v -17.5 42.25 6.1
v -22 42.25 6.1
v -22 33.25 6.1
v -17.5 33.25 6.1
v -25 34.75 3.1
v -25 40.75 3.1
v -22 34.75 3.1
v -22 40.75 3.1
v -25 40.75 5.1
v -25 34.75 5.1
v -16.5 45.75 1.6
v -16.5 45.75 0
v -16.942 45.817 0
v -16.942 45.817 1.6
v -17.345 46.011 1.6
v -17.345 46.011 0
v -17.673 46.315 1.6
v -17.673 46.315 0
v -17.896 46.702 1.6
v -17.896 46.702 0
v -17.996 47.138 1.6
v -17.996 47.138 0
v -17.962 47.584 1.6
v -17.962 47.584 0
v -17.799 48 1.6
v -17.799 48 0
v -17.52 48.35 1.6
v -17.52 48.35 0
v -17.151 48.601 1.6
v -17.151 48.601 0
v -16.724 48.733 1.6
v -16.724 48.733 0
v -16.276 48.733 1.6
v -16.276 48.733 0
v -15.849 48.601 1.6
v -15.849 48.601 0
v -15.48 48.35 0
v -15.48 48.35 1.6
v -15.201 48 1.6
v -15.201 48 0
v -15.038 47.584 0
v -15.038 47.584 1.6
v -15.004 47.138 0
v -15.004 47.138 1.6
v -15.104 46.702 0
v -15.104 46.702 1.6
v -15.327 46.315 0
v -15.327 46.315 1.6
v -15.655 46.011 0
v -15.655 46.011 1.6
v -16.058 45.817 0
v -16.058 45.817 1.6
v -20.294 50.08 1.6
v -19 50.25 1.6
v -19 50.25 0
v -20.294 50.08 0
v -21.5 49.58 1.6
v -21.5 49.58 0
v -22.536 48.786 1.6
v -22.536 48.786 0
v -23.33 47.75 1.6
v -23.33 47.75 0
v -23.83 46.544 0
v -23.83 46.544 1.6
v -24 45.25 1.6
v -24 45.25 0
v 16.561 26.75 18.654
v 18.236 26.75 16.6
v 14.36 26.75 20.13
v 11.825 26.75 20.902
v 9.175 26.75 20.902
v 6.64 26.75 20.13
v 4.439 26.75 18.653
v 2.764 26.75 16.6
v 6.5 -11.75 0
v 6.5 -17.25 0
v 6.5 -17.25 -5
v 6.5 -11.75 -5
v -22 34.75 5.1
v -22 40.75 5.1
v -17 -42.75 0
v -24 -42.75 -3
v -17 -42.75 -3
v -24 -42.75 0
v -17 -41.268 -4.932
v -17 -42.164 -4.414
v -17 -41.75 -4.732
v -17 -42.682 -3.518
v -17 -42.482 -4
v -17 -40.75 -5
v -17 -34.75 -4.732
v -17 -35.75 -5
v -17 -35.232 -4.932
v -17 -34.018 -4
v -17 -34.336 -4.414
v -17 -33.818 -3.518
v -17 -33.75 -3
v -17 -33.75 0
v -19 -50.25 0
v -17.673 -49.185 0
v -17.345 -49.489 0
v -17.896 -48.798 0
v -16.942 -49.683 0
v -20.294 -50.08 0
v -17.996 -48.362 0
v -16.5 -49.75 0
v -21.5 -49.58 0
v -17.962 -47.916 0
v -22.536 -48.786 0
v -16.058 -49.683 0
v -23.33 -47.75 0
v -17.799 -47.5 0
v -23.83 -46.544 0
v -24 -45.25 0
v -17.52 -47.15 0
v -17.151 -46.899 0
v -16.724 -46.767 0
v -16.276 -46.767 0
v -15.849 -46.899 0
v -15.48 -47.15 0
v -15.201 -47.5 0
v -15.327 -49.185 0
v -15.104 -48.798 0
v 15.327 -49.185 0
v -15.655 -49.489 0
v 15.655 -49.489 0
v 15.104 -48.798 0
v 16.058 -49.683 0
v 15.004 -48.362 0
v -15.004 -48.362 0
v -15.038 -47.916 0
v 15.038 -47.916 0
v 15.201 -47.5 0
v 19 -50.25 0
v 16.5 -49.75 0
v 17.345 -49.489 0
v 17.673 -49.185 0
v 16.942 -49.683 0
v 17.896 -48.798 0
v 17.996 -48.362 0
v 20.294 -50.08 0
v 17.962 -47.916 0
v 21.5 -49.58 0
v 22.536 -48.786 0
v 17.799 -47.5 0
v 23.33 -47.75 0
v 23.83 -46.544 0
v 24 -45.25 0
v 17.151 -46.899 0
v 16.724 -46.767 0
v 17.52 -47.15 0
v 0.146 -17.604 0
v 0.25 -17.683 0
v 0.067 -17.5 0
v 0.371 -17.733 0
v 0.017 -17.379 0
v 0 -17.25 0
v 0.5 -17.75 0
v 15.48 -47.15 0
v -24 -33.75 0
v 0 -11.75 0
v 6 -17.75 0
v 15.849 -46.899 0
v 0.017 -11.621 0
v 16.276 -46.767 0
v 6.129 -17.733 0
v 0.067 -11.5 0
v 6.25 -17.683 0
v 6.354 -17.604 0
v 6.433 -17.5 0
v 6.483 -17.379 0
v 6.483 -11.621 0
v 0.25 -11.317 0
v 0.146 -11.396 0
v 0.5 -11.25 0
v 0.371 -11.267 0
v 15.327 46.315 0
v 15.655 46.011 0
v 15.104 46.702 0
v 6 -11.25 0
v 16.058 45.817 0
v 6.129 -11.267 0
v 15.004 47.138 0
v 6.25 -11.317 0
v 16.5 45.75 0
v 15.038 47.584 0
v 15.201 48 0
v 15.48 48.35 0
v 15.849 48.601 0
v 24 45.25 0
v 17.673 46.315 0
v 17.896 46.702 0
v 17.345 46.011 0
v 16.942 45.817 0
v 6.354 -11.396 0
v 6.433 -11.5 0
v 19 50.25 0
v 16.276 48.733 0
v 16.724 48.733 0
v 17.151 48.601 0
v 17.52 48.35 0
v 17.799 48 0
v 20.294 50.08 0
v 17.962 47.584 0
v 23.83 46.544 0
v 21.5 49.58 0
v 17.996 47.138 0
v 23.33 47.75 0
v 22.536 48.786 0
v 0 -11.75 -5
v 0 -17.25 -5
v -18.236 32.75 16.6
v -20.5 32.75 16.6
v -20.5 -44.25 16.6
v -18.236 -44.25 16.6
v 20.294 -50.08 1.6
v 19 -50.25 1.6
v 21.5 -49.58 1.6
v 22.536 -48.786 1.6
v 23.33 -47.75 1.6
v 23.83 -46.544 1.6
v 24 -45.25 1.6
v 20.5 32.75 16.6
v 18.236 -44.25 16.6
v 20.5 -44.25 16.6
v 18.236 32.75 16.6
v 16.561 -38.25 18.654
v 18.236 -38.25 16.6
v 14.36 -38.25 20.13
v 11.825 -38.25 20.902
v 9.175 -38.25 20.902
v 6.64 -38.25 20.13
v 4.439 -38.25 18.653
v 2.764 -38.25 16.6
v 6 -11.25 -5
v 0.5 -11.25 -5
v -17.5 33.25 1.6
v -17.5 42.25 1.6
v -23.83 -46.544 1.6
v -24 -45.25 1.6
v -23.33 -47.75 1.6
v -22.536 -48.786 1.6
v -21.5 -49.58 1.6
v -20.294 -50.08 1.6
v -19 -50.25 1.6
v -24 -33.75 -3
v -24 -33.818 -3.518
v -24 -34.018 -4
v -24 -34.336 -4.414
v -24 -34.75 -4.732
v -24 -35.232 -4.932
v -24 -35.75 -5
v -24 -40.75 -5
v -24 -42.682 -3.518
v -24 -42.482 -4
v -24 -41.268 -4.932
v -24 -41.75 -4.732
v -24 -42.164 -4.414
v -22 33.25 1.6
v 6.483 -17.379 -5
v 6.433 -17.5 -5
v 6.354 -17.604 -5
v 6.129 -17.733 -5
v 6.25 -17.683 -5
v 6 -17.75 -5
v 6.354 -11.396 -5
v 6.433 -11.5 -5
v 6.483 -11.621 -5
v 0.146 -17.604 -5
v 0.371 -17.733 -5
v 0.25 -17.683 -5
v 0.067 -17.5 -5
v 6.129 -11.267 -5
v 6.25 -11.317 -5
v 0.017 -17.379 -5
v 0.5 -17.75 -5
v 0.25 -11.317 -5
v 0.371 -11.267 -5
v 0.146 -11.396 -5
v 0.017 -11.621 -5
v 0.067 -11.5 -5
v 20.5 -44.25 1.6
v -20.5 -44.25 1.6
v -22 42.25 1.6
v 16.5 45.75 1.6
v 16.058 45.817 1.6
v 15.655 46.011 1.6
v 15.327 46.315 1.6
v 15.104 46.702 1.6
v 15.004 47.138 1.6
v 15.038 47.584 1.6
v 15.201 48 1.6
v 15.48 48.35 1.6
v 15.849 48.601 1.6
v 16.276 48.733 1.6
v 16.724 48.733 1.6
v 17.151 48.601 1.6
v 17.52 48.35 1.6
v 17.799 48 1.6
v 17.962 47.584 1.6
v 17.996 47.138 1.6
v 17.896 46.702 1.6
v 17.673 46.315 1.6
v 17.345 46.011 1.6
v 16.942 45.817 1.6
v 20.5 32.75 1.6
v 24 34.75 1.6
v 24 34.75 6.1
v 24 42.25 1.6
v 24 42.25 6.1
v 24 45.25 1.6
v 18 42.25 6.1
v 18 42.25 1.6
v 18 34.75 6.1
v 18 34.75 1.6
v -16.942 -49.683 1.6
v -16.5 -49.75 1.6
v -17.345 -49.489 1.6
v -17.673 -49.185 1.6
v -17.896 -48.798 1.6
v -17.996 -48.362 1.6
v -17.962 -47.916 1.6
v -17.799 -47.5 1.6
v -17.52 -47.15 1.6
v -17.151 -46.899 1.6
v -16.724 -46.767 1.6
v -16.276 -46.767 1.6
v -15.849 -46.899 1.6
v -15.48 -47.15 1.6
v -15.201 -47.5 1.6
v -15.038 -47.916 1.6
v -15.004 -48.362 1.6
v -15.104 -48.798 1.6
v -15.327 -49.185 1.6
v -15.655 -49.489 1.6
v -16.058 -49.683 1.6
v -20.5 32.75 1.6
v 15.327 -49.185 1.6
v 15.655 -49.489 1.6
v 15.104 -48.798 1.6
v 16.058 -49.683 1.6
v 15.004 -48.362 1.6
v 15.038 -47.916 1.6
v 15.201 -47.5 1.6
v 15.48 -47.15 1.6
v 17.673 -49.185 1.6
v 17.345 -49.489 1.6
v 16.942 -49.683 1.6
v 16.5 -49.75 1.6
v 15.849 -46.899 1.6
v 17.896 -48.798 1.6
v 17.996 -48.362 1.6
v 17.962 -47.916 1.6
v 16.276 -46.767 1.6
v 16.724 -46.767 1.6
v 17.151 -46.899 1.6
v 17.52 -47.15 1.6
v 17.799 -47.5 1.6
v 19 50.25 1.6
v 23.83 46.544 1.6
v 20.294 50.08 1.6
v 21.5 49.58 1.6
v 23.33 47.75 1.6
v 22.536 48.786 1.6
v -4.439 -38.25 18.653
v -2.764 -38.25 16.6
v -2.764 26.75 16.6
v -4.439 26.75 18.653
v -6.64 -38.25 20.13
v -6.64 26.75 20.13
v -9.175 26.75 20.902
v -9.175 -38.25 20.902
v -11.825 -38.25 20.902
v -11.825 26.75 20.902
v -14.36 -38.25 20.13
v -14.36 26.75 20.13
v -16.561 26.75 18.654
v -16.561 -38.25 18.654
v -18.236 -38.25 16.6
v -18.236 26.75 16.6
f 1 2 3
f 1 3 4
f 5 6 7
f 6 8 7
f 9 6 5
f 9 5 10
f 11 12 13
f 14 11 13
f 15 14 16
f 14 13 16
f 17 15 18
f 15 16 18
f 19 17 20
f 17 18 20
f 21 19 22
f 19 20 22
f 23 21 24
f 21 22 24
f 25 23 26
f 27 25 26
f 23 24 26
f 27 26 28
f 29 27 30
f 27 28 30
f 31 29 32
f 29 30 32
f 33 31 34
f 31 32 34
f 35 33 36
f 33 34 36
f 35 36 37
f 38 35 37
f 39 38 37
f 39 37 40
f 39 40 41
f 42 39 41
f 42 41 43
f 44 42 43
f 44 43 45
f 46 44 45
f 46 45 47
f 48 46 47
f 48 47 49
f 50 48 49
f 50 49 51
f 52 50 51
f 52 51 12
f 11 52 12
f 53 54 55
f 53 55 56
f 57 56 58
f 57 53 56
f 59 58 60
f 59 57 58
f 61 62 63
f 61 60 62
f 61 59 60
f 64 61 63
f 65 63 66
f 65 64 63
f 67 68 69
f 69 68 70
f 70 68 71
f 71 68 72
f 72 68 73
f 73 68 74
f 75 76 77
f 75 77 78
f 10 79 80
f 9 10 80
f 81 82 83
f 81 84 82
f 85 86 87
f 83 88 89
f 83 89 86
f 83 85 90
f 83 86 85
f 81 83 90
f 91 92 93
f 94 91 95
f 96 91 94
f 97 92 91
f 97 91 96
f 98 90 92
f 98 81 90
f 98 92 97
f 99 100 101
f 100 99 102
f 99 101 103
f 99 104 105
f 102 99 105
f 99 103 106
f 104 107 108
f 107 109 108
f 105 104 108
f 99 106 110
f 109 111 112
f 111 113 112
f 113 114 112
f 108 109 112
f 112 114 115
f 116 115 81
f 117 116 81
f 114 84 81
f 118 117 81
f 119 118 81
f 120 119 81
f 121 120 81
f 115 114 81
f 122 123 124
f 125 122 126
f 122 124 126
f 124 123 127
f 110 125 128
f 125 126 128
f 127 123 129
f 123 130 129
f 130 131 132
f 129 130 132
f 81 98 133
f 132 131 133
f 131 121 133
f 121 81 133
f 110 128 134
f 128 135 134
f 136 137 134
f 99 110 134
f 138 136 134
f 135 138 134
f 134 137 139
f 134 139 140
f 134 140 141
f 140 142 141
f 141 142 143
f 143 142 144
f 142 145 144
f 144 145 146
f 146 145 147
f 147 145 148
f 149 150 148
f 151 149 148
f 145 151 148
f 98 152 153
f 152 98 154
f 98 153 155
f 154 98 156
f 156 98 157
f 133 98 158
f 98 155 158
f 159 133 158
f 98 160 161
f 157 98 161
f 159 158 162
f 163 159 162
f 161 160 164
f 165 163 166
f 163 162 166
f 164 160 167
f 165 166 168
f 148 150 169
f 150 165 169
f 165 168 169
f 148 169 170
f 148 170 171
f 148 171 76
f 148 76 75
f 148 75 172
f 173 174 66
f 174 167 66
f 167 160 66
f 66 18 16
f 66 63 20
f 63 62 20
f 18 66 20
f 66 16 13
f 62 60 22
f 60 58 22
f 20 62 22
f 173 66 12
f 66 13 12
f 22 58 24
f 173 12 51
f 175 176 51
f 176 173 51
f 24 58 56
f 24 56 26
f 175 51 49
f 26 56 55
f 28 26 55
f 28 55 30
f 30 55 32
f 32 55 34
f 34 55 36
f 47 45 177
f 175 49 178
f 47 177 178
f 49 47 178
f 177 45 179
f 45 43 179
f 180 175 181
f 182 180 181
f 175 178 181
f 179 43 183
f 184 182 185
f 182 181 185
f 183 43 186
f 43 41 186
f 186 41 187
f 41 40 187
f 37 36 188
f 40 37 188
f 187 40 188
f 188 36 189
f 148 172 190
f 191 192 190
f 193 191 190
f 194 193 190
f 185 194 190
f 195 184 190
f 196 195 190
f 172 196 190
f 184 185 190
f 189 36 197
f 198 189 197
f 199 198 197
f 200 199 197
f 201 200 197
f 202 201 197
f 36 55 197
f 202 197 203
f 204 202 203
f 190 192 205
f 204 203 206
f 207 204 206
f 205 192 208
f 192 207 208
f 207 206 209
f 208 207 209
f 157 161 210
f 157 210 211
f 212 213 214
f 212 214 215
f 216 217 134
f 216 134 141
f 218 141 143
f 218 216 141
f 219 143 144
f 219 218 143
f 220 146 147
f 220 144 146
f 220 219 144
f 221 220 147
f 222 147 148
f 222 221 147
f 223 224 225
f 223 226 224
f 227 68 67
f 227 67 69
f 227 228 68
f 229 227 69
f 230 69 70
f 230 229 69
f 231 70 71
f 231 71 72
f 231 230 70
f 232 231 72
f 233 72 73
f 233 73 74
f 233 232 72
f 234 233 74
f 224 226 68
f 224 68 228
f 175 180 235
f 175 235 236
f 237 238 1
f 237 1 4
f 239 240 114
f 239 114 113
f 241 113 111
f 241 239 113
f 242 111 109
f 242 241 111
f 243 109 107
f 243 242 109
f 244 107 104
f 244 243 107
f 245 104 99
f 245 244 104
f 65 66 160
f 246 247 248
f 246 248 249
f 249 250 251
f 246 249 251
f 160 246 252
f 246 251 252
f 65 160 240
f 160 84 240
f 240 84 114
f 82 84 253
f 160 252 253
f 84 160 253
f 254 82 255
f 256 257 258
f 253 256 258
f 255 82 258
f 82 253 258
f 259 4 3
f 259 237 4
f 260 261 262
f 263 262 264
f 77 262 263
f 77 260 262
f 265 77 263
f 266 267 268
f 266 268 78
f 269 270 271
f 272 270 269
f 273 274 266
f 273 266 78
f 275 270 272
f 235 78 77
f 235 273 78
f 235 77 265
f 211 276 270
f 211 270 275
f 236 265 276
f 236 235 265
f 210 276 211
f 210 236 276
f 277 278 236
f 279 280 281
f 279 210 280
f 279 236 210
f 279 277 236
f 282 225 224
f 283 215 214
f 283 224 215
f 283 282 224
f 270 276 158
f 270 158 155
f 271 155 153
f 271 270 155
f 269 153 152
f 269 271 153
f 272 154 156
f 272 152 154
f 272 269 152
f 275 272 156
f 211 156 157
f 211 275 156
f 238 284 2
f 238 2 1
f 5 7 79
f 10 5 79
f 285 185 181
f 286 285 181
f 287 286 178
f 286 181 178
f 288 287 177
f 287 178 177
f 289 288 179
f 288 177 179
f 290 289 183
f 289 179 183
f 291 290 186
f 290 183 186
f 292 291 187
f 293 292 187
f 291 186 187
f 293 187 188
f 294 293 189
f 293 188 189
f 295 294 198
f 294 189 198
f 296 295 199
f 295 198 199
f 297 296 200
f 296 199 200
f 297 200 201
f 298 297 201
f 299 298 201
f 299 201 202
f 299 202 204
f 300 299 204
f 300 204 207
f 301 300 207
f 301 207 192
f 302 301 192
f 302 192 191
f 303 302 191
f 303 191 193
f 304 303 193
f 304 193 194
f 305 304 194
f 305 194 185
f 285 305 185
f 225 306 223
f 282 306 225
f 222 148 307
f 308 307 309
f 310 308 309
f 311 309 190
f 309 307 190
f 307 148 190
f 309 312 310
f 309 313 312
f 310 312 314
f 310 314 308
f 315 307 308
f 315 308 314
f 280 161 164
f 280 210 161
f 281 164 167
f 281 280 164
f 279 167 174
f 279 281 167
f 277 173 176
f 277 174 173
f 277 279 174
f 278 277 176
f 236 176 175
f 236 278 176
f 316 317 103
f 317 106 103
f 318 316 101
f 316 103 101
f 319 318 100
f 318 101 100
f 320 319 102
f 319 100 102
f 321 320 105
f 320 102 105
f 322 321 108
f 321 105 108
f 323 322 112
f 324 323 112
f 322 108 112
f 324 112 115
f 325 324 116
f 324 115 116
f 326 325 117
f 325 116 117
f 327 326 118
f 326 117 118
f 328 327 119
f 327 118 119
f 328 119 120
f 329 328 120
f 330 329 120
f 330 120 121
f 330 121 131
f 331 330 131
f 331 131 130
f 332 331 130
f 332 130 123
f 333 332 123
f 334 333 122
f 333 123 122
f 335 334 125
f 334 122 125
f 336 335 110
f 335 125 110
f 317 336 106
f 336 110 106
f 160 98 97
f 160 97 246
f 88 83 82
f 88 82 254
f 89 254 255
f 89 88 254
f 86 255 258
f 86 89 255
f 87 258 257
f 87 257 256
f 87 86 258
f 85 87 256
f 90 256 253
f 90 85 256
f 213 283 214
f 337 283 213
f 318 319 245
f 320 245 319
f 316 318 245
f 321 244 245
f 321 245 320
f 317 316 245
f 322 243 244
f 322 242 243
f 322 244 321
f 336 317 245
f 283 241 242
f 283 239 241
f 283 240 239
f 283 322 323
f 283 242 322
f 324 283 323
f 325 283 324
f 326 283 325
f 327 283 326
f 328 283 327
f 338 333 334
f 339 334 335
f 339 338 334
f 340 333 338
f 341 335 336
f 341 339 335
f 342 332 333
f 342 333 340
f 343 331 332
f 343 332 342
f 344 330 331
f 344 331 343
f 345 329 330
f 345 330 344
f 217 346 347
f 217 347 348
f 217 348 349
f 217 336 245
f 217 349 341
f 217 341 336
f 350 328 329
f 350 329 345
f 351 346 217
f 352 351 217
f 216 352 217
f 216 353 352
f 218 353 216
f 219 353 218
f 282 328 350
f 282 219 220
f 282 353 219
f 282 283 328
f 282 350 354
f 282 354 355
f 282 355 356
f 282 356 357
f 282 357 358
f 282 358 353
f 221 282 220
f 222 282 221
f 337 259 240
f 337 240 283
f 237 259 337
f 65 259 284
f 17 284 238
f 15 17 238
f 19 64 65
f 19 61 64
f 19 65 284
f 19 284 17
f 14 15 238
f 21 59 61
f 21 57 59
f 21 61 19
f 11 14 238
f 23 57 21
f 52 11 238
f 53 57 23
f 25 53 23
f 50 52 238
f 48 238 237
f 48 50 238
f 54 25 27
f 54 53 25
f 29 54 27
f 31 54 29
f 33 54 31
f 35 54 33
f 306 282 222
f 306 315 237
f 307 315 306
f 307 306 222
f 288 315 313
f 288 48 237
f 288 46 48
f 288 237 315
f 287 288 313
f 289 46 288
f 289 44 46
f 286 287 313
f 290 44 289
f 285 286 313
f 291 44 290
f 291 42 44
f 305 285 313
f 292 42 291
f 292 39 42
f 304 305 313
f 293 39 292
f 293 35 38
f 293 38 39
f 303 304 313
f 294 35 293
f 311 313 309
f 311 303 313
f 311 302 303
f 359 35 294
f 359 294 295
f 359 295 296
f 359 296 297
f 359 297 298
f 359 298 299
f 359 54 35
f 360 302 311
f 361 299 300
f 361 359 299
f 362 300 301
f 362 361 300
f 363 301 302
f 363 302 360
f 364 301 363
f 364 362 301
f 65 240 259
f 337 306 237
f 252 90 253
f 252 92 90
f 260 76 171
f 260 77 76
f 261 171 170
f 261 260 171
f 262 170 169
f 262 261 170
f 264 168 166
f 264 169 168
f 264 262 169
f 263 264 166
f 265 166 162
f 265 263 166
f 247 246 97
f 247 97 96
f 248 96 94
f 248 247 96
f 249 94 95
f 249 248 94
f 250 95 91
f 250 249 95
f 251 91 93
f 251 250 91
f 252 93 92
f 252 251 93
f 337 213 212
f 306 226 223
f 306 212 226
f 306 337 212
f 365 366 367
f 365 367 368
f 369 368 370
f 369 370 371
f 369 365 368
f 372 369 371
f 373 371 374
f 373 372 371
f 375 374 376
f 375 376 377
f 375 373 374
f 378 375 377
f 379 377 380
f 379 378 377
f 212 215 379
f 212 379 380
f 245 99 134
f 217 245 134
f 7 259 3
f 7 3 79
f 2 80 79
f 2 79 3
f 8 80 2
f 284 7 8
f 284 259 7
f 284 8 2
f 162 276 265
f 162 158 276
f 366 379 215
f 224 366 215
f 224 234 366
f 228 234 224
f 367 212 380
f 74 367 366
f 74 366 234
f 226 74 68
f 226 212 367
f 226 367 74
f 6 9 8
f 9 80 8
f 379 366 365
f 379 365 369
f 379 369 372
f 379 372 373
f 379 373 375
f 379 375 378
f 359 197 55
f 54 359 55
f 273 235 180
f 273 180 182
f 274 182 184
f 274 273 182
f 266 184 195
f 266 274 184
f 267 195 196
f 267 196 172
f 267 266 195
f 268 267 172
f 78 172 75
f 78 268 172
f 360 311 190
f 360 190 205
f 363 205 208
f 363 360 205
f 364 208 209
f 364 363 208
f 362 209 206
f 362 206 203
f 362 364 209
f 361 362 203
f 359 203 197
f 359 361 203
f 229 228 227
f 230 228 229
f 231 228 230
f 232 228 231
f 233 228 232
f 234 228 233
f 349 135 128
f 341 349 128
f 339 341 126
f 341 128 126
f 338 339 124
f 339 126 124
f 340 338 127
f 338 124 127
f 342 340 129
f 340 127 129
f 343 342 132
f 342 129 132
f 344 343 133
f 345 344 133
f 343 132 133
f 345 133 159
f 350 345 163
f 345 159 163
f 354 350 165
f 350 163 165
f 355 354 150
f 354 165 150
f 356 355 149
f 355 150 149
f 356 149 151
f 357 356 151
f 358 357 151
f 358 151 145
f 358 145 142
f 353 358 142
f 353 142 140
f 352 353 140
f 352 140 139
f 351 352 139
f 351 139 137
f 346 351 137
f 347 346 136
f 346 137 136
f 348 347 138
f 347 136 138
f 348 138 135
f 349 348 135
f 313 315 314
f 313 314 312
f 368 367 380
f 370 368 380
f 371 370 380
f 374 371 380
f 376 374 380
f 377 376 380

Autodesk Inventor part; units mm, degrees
ref_plane "YZ Plane" through (0, 0, 0) normal (1, 0, 0) x (0, 1, 0)
ref_plane "XZ Plane" through (0, 0, 0) normal (0, 1, 0) x (-1, 0, 0)
ref_plane "XY Plane" through (0, 0, 0) normal (0, 0, 1) x (1, 0, 0)
sketch "Skizze1" plane through (0, 0, 0) normal (0, 0, 1) x (1, 0, 0)
  line L0 (24, 50.25) -> (-24, 50.25)
  line L1 (-24, 50.25) -> (-24, -50.25)
  line L2 (-24, -50.25) -> (24, -50.25)
  line L3 (24, -50.25) -> (24, 50.25)
  line L4 (24, 50.25) -> (-24, -50.25) construction
  line L5 (-24, 50.25) -> (24, -50.25) construction
  point P0 (0, 0)
  dimension "d0" = 48
  dimension "d1" = 100.5
extrude "Extrusion1" add sketch "Skizze1" along normal blind 1.6
fillet "Rundung1" radius 5 4 edges at (24, 50.25, 0.8) (-24, 50.25, 0.8) (24, -50.25, 0.8) (-24, -50.25, 0.8)
sketch "Skizze2" plane through (0, 0, 0) normal (0, 0, -1) x (-1, 0, 0)
  line L0 (-6.5, -11.25) -> (0, -11.25)
  line L1 (0, -11.25) -> (0, -17.75)
  line L2 (0, -17.75) -> (-6.5, -17.75)
  line L3 (-6.5, -17.75) -> (-6.5, -11.25)
  line L4 (-6.5, -11.25) -> (0, -17.75) construction
  line L5 (0, -11.25) -> (-6.5, -17.75) construction
  line L6 (19, -50.25) -> (-19, -50.25) projected
  line L7 (-24, -45.25) -> (-24, 45.25) projected
  point P0 (0, 0)
  point P1 (-3.25, -14.5)
  point P2 (-3.25, -17.75)
  dimension "d5" = 32.5
  dimension "d6" = 17.5
  dimension "d7" = 6.5
  dimension "d8" = 6.5
extrude "Extrusion2" add sketch "Skizze2" along normal blind 5
fillet "Rundung2" radius 0.5 4 edges at (0, -11.25, -2.5) (0, -17.75, -2.5) (6.5, -17.75, -2.5) (6.5, -11.25, -2.5)
sketch "Skizze3" plane through (0, 0, 0) normal (0, 0, -1) x (-1, 0, 0)
  line L0 (17, -33.75) -> (24, -33.75)
  line L1 (24, -33.75) -> (24, -42.75)
  line L2 (24, -42.75) -> (17, -42.75)
  line L3 (17, -42.75) -> (17, -33.75)
  line L4 (17, -33.75) -> (24, -42.75) construction
  line L5 (24, -33.75) -> (17, -42.75) construction
  line L6 (19, -50.25) -> (-19, -50.25) projected
  line L7 (24, 45.25) -> (24, -45.25) projected
  point P0 (0, 0)
  point P1 (20.5, -38.25)
  dimension "d12" = 7.5
  dimension "d13" = 7
  dimension "d14" = 9
extrude "Extrusion3" add sketch "Skizze3" along normal blind 5
fillet "Rundung3" radius 2 2 edges at (-20.5, -33.75, -5) (-20.5, -42.75, -5)
sketch "Skizze4" plane through (0, 0, 1.6) normal (0, 0, 1) x (1, 0, 0)
  line L0 (18, 42.25) -> (24, 42.25)
  line L1 (24, 42.25) -> (24, 34.75)
  line L2 (24, 34.75) -> (18, 34.75)
  line L3 (18, 34.75) -> (18, 42.25)
  line L4 (18, 42.25) -> (24, 34.75) construction
  line L5 (24, 42.25) -> (18, 34.75) construction
  line L6 (24, -45.25) -> (24, 45.25) projected
  line L7 (-24, 45.25) -> (-24, -45.25) projected
  line L8 (19, 50.25) -> (-19, 50.25) projected
  line L9 (-22, 42.25) -> (-17.5, 42.25)
  line L10 (-17.5, 42.25) -> (-17.5, 33.25)
  line L11 (-17.5, 33.25) -> (-22, 33.25)
  line L12 (-22, 33.25) -> (-22, 42.25)
  line L13 (-22, 42.25) -> (-17.5, 33.25) construction
  line L14 (-17.5, 42.25) -> (-22, 33.25) construction
  point P0 (0, 0)
  point P1 (21, 38.5)
  point P2 (21, 42.25)
  point P3 (-19.75, 37.75)
  dimension "d19" = 8
  dimension "d20" = 7.5
  dimension "d21" = 6
  dimension "d22" = 8
  dimension "d23" = 9
  dimension "d24" = 4.5
  dimension "d25" = 2
extrude "Extrusion4" add sketch "Skizze4" along normal blind 4.5
sketch "Skizze5" plane through (-22, 33.25, 1.6) normal (-1, 0, 0) x (0, 0, 1)
  line L0 (1.5, 1.5) -> (3.5, 1.5)
  line L1 (3.5, 1.5) -> (3.5, 7.5)
  line L2 (3.5, 7.5) -> (1.5, 7.5)
  line L3 (1.5, 7.5) -> (1.5, 1.5)
  line L4 (1.5, 1.5) -> (3.5, 7.5) construction
  line L5 (3.5, 1.5) -> (1.5, 7.5) construction
  line L6 (0, 9) -> (4.5, 9) projected
  line L7 (4.5, 9) -> (4.5, 0) projected
  point P0 (-1.6, -33.25)
  point P1 (2.5, 4.5)
  dimension "d28" = 1.5
  dimension "d29" = 6
  dimension "d30" = 1
  dimension "d31" = 2
extrude "Extrusion5" add sketch "Skizze5" along normal blind 3
sketch "Skizze6" plane through (0, 0, 1.6) normal (0, 0, 1) x (1, 0, 0)
  line L0 (-20.5, 32.75) -> (20.5, 32.75)
  line L1 (20.5, 32.75) -> (20.5, -44.25)
  line L2 (20.5, -44.25) -> (-20.5, -44.25)
  line L3 (-20.5, -44.25) -> (-20.5, 32.75)
  line L4 (-20.5, 32.75) -> (20.5, -44.25) construction
  line L5 (20.5, 32.75) -> (-20.5, -44.25) construction
  line L6 (-19, -50.25) -> (19, -50.25) projected
  line L7 (24, -45.25) -> (24, 34.75) projected
  line L8 (-24, 45.25) -> (-24, -45.25) projected
  point P0 (0, 0)
  point P1 (0, -5.75)
  dimension "d34" = 6
  dimension "d35" = 3.5
  dimension "d36" = 3.5
  dimension "d37" = 77
extrude "Extrusion6" add sketch "Skizze6" along normal blind 15
sketch "Skizze7" plane through (-20.5, -44.25, 1.6) normal (0, -1, 0) x (1, 0, 0)
  circle A0 centre (10, 10.4) radius 9
  circle A1 centre (31, 10.4) radius 9
  line L0 (1.5, -1.6) -> (39.5, -1.6) projected
  line L1 (1.5, 0) -> (39.5, 0) projected
  point P0 (20.5, -1.6)
  point P1 (20.5, 0)
  dimension "d40" = 18
  dimension "d41" = 18
  dimension "d42" = 21
  dimension "d43" = 21
  dimension "d44" = 21
  dimension "d45" = 10.5
extrude "Extrusion7" add sketch "Skizze7" against normal blind 77
sketch "Skizze8" plane through (0, 0, 16.6) normal (0, 0, 1) x (1, 0, 0)
  line L0 (-18.2356, -44.25) -> (-18.2356, 32.75) projected
  line L1 (-18.2356, 32.75) -> (-20.5, 32.75) projected
  line L2 (-20.5, 32.75) -> (-20.5, -44.25) projected
  line L3 (-20.5, -44.25) -> (-18.2356, -44.25) projected
  line L4 (18.2356, 32.75) -> (18.2356, -44.25) projected
  line L5 (18.2356, -44.25) -> (20.5, -44.25) projected
  line L6 (20.5, -44.25) -> (20.5, 32.75) projected
  line L7 (20.5, 32.75) -> (18.2356, 32.75) projected
  line L8 (20.5, -44.25) -> (20.5, 32.75) projected
  line L9 (-20.5, 32.75) -> (20.5, 32.75)
  line L10 (20.5, 32.75) -> (20.5, 26.75)
  line L11 (20.5, 26.75) -> (-20.5, 26.75)
  line L12 (-20.5, 26.75) -> (-20.5, 32.75)
  line L13 (-20.5, -44.25) -> (20.5, -44.25)
  line L14 (20.5, -44.25) -> (20.5, -38.25)
  line L15 (20.5, -38.25) -> (-20.5, -38.25)
  line L16 (-20.5, -38.25) -> (-20.5, -44.25)
  point P0 (0, 0)
  point P1 (18.2356, -38.25)
  point P2 (-18.2356, -38.25)
  point P3 (-18.2356, 26.75)
  point P4 (18.2356, 26.75)
  dimension "d48" = 6
  dimension "d49" = 6
extrude "Extrusion8" cut sketch "Skizze8" along normal blind 10 contours L0 L15 L4 L13 | L0 L9 L4 L11
sketch "Skizze9" plane through (0, 0, 1.6) normal (0, 0, 1) x (1, 0, 0)
  line L0 (-16.5, 47.25) -> (16.5, 47.25)
  line L1 (16.5, 47.25) -> (16.5, -48.25)
  line L2 (16.5, -48.25) -> (-16.5, -48.25)
  line L3 (-16.5, -48.25) -> (-16.5, 47.25)
  line L4 (19, 50.25) -> (-19, 50.25) projected
  line L5 (20.5, 32.75) -> (-20.5, 32.75) projected
  point P0 (0, 0)
  point P1 (0, 32.75)
  point P2 (0, 47.25)
  dimension "d52" = 33
  dimension "d53" = 95.5
  dimension "d54" = 3
  dimension "d55" = 0
hole "Bohrung1" at (-16.5, 47.25, 1.6) at (16.5, 47.25, 1.6) at (-16.5, -48.25, 1.6) at (16.5, -48.25, 1.6) direction (0, 0, -1) diameter 3 depth 1.6
equation "\"d45\" = 0.5 * d44"
properties part number "010_Battery_2Cell"
